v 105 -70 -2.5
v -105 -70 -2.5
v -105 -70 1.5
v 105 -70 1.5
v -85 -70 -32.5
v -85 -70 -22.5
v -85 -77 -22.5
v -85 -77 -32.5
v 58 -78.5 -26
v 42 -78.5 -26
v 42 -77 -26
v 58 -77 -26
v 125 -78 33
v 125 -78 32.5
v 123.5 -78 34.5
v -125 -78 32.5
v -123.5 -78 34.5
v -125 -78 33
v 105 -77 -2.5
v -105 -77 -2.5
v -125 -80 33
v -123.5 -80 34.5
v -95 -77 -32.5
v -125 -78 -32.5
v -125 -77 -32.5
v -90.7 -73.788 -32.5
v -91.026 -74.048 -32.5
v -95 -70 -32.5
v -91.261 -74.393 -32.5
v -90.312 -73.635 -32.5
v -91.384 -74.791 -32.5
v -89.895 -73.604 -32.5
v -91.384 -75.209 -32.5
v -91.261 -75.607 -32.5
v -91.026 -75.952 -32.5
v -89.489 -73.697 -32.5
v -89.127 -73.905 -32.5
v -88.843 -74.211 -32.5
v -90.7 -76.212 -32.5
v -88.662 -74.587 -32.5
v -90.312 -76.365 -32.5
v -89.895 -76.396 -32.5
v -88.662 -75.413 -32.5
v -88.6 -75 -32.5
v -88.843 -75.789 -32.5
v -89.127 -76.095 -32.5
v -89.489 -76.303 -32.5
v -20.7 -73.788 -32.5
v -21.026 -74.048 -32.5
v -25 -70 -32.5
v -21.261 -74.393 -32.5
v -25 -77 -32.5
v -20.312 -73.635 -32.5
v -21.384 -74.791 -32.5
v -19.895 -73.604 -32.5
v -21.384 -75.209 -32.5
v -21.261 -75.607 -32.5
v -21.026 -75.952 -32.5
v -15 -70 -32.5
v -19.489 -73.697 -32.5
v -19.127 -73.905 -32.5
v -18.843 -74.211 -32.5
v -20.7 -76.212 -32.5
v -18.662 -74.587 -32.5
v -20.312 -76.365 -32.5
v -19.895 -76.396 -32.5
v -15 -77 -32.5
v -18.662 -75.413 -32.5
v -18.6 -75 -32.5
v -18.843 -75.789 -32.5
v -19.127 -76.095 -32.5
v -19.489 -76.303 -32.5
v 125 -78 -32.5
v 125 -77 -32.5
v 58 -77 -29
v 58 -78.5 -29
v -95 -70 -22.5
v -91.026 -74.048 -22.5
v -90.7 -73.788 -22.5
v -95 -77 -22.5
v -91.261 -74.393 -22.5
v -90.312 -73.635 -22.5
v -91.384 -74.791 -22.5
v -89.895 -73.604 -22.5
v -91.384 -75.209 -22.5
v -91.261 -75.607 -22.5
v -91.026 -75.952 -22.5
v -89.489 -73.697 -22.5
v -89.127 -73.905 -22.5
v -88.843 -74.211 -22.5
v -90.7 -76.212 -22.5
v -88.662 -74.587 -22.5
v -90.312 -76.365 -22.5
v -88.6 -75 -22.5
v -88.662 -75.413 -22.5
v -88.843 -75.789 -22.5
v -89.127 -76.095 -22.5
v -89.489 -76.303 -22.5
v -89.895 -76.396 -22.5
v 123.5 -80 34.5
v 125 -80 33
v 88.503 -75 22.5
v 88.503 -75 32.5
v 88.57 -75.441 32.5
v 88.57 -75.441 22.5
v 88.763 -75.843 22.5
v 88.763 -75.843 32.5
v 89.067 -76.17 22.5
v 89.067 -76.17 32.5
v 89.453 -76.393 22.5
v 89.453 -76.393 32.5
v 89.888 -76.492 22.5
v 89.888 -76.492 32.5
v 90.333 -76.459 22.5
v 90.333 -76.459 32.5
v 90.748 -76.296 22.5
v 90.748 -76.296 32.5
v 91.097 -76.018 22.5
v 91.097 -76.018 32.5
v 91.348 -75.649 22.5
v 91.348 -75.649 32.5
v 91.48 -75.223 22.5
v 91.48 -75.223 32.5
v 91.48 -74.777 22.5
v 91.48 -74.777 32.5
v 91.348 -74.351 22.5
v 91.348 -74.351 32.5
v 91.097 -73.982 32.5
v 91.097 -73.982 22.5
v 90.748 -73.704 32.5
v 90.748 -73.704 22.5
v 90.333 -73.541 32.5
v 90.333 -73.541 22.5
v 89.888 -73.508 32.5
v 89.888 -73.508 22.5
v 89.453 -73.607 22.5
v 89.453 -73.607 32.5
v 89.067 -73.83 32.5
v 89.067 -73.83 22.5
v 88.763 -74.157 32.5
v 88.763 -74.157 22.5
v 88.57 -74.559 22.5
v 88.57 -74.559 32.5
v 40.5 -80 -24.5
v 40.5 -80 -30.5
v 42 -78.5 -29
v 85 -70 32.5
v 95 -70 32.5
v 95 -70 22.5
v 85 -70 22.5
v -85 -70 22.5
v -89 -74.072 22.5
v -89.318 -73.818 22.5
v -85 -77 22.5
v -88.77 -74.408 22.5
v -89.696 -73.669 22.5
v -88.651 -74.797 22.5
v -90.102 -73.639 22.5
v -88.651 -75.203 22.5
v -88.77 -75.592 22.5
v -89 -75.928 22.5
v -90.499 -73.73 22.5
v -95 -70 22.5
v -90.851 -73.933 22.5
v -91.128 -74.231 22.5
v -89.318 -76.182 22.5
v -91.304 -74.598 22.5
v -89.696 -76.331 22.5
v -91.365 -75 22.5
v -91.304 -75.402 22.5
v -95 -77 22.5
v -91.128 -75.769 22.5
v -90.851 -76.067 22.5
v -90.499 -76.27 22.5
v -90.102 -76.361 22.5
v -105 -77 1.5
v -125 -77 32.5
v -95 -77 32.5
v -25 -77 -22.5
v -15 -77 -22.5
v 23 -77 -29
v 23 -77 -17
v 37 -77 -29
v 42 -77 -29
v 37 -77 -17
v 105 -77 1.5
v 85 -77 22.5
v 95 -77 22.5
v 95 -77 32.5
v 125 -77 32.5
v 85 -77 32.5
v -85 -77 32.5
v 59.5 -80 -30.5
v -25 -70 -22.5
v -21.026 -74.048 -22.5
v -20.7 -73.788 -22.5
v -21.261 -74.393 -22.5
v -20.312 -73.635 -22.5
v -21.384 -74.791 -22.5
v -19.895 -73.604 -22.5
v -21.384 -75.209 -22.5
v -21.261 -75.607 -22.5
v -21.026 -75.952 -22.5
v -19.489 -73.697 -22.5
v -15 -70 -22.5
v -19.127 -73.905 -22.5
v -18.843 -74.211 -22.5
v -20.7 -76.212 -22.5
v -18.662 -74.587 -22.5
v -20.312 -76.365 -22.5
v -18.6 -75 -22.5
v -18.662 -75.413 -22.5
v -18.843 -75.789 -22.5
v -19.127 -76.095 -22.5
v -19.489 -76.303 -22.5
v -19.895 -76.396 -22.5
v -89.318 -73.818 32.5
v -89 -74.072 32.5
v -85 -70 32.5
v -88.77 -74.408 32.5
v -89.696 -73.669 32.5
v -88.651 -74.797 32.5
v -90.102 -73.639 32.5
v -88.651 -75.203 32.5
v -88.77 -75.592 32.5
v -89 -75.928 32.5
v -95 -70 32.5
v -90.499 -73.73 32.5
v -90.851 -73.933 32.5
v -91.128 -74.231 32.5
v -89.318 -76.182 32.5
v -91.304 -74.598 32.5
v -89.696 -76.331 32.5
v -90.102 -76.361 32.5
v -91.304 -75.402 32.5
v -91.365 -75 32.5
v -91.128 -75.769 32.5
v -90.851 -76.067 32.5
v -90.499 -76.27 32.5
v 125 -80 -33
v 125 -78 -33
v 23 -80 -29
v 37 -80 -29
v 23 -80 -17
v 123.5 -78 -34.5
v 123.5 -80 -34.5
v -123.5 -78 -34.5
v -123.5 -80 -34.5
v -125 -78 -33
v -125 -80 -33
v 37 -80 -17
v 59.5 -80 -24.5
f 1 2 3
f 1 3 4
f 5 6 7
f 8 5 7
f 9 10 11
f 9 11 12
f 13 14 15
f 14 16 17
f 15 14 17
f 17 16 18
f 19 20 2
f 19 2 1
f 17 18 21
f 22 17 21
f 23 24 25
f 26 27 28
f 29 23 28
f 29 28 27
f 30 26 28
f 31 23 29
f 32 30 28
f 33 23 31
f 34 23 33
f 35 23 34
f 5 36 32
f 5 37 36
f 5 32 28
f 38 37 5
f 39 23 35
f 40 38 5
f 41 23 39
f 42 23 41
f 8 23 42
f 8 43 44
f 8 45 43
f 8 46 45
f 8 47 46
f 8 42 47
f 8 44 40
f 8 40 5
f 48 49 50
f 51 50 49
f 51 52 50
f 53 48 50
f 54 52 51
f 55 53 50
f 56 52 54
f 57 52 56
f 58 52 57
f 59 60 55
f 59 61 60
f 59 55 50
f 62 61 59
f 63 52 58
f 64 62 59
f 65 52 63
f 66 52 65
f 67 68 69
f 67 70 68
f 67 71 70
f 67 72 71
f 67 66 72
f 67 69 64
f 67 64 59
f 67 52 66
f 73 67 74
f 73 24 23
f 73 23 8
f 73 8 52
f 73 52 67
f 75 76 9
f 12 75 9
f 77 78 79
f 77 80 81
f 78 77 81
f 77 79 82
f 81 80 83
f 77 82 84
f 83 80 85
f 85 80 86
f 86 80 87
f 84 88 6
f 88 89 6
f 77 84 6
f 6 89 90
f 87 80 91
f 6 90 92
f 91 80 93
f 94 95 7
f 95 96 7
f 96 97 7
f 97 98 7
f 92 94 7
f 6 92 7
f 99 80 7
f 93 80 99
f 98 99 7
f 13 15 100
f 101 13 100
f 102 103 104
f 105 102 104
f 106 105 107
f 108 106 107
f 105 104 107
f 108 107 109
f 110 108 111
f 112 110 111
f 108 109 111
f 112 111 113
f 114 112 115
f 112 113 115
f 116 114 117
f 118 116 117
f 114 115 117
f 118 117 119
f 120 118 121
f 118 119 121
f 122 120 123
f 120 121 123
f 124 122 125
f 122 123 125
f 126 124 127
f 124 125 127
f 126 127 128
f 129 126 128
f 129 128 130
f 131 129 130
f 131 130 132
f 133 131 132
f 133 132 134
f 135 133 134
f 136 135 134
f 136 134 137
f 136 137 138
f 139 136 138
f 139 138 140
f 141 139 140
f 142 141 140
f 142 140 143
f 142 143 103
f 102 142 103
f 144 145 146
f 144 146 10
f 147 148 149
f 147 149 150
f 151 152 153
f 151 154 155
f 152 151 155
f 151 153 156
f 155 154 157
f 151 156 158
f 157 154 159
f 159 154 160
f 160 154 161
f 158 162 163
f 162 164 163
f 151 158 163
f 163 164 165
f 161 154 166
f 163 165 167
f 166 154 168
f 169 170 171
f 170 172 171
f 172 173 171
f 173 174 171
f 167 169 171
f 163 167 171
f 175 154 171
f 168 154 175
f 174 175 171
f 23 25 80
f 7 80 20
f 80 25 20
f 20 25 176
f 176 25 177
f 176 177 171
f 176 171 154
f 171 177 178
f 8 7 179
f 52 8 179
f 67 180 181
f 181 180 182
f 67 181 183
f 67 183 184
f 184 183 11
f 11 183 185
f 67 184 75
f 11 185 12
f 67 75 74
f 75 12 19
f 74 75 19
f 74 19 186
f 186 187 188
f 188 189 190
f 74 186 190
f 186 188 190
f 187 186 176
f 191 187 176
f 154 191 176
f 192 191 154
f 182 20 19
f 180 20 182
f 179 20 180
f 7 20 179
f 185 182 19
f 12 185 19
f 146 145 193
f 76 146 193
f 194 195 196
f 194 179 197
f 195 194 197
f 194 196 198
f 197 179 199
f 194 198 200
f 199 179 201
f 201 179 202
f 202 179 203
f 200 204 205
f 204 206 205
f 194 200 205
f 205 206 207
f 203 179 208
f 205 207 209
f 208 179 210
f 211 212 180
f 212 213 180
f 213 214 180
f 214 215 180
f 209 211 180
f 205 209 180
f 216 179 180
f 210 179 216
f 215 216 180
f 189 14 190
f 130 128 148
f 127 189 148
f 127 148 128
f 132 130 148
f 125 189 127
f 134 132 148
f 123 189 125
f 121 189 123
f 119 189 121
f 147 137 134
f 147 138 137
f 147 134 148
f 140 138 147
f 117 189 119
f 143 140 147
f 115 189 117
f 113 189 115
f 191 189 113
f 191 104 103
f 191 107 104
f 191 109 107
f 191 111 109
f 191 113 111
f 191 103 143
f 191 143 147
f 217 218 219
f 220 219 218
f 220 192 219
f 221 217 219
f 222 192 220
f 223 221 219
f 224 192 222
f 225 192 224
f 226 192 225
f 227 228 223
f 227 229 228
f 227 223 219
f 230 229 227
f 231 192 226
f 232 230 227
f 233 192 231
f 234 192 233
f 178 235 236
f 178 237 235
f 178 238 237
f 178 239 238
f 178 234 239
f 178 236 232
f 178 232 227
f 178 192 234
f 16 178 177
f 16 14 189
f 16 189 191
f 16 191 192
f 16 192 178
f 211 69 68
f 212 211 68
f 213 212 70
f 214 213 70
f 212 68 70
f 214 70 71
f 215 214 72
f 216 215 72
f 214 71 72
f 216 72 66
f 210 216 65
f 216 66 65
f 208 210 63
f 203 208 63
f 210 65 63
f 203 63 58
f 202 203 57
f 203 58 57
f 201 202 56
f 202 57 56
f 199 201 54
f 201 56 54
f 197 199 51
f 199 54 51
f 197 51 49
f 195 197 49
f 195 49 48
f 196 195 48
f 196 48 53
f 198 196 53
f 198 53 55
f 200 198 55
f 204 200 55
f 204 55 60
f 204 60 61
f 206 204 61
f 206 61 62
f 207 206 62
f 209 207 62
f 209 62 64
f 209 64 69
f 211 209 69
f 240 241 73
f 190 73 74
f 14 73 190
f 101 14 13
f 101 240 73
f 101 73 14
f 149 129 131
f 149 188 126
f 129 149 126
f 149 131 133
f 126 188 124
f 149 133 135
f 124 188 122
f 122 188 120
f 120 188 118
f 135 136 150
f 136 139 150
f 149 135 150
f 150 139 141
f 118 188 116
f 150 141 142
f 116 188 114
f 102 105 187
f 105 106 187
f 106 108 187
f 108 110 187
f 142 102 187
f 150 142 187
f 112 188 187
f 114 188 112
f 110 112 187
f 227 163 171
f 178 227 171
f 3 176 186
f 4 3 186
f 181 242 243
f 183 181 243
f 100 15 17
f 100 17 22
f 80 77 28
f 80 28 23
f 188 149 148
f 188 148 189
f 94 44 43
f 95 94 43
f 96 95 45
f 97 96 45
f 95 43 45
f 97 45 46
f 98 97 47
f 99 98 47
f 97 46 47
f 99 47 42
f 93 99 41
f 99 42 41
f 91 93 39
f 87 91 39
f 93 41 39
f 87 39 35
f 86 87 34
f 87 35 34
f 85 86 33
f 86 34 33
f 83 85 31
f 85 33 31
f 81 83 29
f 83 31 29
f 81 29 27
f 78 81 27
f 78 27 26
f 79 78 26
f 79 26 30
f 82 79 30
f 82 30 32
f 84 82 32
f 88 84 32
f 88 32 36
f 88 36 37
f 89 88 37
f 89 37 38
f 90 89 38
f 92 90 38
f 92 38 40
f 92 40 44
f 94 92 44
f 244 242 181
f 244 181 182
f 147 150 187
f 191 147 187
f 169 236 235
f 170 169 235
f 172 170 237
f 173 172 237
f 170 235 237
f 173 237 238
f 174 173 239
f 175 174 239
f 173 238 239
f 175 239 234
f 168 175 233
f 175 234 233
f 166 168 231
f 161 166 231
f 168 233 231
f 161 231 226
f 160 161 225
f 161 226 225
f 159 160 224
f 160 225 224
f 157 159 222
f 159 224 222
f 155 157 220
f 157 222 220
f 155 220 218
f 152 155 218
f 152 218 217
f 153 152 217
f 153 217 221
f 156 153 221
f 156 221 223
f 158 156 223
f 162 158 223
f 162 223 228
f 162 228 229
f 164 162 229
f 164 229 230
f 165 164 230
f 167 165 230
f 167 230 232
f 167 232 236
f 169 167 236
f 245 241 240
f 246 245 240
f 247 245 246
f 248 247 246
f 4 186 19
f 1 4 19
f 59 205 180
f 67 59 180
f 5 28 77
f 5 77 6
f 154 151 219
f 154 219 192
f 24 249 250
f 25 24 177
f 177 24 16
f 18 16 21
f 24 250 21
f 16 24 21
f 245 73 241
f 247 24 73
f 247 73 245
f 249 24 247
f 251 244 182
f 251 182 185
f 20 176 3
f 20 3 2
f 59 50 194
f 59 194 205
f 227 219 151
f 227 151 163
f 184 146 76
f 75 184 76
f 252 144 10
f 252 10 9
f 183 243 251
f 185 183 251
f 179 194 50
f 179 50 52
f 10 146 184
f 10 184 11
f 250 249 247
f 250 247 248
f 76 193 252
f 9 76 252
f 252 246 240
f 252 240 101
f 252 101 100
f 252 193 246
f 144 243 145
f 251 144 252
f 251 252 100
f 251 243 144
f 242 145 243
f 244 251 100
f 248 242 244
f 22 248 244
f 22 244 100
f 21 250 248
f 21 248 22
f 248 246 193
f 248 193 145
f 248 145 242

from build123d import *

# Parameters (mm, degrees)
SKETCH006_W     = 250
SKETCH006_H     = 65
PAD003_DEPTH    = 3
SKETCH014_W     = 14
SKETCH014_H     = 12
SKETCH014_W_2   = 16
SKETCH014_H_2   = 3
POCKET006_DEPTH = 5
SKETCH029_W     = 10
SKETCH029_H     = 8
PAD010_DEPTH    = 10
SKETCH034_W     = 10
SKETCH034_H     = 8
PAD012_DEPTH    = 10
SKETCH038_R     = 1.496657
SKETCH038_R_2   = 1.36472
POCKET040_DEPTH = 11
SKETCH030_R     = 1.4
POCKET041_DEPTH = 14
SKETCH041_W     = 210
SKETCH041_H     = 4
PAD022_DEPTH    = 7
SKETCH042_W     = 2
SKETCH042_H     = 2
PAD023_DEPTH    = 250
CHAMFER036_SIZE = 1.5


with BuildPart() as part:
    # Sketch006 → Pad003 (new body)
    with BuildSketch(Plane.XZ):
        Rectangle(SKETCH006_W, SKETCH006_H)
    extrude(amount=PAD003_DEPTH)

    # Sketch014 (on Face6 of Pad003) → Pocket006 (cut)
    with BuildSketch(Plane.XZ.offset(3)):
        with Locations((30, -23)):
            Rectangle(SKETCH014_W, SKETCH014_H)
        with Locations((50, -27.5)):
            Rectangle(SKETCH014_W_2, SKETCH014_H_2)
    extrude(amount=-POCKET006_DEPTH, mode=Mode.SUBTRACT)

    # Sketch029 (on Face1 of Pocket006) → Pad010 (join)
    with BuildSketch(Plane(origin=(0, 0, 32.5), x_dir=(-1, 0, 0), z_dir=(0, 0, 1))):
        with Locations((-90, -3)):
            Rectangle(SKETCH029_W, SKETCH029_H)
        with Locations((90, -3)):
            Rectangle(SKETCH029_W, SKETCH029_H)
    extrude(amount=-PAD010_DEPTH)

    # Sketch034 → Pad012 (join)
    with BuildSketch(Plane(origin=(0, 0, -32.5), x_dir=(1, 0, 0), z_dir=(0, 0, -1))):
        with Locations((-20, -3)):
            Rectangle(SKETCH034_W, SKETCH034_H)
        with Locations((-90, -3)):
            Rectangle(SKETCH034_W, SKETCH034_H)
    extrude(amount=-PAD012_DEPTH)

    # Sketch038 (on Face30 of Pad012) → Pocket040 (cut)
    with BuildSketch(Plane(origin=(0, 0, 32.5), x_dir=(-1, 0, 0), z_dir=(0, 0, 1))):
        with Locations((-90, -2)):
            Circle(SKETCH038_R)
        with Locations((90, -2)):
            Circle(SKETCH038_R_2)
    extrude(amount=-POCKET040_DEPTH, mode=Mode.SUBTRACT)

    # Sketch030 → Pocket041 (cut)
    with BuildSketch(Plane(origin=(0, 0, -32.5), x_dir=(1, 0, 0), z_dir=(0, 0, -1))):
        with Locations((-20, -2)):
            Circle(SKETCH030_R)
        with Locations((-90, -2)):
            Circle(SKETCH030_R)
    extrude(amount=-POCKET041_DEPTH, mode=Mode.SUBTRACT)

    # Sketch041 → Pad022 (join)
    with BuildSketch(Plane(origin=(0, 0, 0), x_dir=(1, 0, 0), z_dir=(0, 1, 0))):
        with Locations((0, 0.5)):
            Rectangle(SKETCH041_W, SKETCH041_H)
    extrude(amount=PAD022_DEPTH)

    # Sketch042 → Pad023 (join)
    with BuildSketch(Plane(origin=(-125, 0, 0), x_dir=(0, 0, -1), z_dir=(-1, 0, 0))):
        with Locations((33.5, 2)):
            Rectangle(SKETCH042_W, SKETCH042_H)
    pad023 = extrude(amount=-PAD023_DEPTH)

    # Mirrored007: Pad023 across Sketch042 V_Axis
    add(pad023.mirror(Plane(origin=(-125, 0, 0), x_dir=(-1, 0, 0), z_dir=(0, 0, -1))))

    # Chamfer036
    chamfer036_edges = [part.edges().sort_by_distance(p)[0] for p in [
        (50, -3, -26),
        (58, -3, -27.5),
        (42, -3, -27.5),
        (50, -3, -29),
        (125, -2, -34.5),
        (125, -2, 34.5),
        (-125, -2, 34.5),
        (-125, -2, -34.5),
    ]]
    chamfer(chamfer036_edges, length=CHAMFER036_SIZE)


with BuildPart() as part_1:
    # Body002 placement: moved
    add(part.part.moved(Location((0, -77, 0))))


solid = part_1.part
